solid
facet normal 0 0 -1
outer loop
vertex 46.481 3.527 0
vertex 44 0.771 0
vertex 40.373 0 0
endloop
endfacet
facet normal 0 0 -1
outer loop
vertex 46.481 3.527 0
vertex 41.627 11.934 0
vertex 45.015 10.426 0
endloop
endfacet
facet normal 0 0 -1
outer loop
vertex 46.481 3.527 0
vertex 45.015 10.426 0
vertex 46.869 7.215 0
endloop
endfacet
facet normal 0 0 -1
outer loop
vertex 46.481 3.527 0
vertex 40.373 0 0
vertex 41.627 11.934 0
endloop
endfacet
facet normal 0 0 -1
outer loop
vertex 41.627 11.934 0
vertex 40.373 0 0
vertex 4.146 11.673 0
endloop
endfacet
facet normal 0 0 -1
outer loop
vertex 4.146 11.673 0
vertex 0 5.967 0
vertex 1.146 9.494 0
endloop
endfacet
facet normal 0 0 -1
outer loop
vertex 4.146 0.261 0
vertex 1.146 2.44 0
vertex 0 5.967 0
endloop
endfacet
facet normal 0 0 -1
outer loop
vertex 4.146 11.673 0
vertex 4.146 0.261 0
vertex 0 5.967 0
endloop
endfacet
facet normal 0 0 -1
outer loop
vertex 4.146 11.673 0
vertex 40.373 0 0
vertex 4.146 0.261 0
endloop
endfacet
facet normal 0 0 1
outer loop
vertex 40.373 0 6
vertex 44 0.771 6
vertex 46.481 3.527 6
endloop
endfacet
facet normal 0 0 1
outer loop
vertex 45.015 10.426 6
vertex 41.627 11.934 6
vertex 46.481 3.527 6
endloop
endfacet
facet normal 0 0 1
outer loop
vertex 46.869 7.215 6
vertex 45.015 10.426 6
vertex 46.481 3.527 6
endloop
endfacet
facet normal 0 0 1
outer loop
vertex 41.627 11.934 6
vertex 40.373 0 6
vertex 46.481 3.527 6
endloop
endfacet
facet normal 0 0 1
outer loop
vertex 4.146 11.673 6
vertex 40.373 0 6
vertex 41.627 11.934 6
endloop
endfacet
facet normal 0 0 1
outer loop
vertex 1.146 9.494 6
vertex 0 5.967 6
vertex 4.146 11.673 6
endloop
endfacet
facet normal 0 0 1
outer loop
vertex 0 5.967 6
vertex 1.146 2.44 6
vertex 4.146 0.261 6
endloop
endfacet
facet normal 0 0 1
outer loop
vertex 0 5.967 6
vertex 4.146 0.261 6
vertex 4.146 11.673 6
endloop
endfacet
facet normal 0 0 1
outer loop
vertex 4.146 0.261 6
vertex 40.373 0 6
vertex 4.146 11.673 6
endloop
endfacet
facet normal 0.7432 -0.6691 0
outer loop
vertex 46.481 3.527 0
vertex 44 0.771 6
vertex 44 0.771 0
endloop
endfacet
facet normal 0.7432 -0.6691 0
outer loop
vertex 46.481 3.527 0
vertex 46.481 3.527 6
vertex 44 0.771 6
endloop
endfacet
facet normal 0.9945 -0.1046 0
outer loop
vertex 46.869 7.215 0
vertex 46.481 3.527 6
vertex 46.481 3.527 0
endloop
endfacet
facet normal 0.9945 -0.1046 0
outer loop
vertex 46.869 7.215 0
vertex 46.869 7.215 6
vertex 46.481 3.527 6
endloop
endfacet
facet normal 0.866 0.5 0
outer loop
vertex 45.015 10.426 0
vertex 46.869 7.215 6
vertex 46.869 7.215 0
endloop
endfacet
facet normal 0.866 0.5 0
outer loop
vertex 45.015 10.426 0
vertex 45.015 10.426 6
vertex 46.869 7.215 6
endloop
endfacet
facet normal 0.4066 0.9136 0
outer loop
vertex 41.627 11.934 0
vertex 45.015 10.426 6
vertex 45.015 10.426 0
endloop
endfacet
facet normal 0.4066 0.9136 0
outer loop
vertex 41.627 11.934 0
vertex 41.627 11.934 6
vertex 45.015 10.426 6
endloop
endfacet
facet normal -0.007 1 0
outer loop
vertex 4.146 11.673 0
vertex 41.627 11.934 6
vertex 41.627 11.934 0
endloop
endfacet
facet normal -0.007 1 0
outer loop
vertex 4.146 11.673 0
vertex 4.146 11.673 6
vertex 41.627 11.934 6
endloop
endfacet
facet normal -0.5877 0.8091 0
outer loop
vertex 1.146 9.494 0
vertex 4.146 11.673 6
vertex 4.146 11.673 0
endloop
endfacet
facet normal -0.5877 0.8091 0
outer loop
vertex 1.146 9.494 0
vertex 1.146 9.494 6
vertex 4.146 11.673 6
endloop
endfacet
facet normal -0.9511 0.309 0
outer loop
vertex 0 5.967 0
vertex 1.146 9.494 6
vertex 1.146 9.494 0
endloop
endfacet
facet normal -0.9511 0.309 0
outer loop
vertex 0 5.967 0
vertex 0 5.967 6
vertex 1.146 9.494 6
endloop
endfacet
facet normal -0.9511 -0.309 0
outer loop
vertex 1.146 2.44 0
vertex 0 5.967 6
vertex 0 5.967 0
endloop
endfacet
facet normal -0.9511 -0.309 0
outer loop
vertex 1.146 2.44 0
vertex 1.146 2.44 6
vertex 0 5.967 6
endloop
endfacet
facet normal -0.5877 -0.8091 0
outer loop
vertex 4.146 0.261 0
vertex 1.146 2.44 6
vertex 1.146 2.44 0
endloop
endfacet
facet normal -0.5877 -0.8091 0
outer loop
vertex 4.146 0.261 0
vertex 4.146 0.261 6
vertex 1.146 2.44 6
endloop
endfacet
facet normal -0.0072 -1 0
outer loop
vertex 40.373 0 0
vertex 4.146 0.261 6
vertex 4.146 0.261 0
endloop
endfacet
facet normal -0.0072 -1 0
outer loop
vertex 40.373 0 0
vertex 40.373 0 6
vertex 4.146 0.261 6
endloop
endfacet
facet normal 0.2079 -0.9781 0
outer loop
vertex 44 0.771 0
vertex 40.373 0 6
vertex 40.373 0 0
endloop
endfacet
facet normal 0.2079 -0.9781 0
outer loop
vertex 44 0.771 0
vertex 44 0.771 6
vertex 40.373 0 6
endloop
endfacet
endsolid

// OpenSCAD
$fn = 32;

// ----------------------------------------------------------------------
// Lever arm: two bosses 12 and 12 mm, 35 mm between centres
// ----------------------------------------------------------------------

// --- parameters (mm) ---
profile_height = 6;       // extrusion height
profile_points = 11;      // points of the closed outline

profile = [[0, 5.967], [1.146, 2.44], [4.146, 0.261], [40.373, 0], [44, 0.771], [46.481, 3.527], [46.869, 7.215], [45.015, 10.426], [41.627, 11.934], [4.146, 11.673], [1.146, 9.494]];  // single closed polygon, 11 points, counter clockwise

// --- the one profile operation ---
linear_extrude(height = profile_height) polygon(points = profile);
